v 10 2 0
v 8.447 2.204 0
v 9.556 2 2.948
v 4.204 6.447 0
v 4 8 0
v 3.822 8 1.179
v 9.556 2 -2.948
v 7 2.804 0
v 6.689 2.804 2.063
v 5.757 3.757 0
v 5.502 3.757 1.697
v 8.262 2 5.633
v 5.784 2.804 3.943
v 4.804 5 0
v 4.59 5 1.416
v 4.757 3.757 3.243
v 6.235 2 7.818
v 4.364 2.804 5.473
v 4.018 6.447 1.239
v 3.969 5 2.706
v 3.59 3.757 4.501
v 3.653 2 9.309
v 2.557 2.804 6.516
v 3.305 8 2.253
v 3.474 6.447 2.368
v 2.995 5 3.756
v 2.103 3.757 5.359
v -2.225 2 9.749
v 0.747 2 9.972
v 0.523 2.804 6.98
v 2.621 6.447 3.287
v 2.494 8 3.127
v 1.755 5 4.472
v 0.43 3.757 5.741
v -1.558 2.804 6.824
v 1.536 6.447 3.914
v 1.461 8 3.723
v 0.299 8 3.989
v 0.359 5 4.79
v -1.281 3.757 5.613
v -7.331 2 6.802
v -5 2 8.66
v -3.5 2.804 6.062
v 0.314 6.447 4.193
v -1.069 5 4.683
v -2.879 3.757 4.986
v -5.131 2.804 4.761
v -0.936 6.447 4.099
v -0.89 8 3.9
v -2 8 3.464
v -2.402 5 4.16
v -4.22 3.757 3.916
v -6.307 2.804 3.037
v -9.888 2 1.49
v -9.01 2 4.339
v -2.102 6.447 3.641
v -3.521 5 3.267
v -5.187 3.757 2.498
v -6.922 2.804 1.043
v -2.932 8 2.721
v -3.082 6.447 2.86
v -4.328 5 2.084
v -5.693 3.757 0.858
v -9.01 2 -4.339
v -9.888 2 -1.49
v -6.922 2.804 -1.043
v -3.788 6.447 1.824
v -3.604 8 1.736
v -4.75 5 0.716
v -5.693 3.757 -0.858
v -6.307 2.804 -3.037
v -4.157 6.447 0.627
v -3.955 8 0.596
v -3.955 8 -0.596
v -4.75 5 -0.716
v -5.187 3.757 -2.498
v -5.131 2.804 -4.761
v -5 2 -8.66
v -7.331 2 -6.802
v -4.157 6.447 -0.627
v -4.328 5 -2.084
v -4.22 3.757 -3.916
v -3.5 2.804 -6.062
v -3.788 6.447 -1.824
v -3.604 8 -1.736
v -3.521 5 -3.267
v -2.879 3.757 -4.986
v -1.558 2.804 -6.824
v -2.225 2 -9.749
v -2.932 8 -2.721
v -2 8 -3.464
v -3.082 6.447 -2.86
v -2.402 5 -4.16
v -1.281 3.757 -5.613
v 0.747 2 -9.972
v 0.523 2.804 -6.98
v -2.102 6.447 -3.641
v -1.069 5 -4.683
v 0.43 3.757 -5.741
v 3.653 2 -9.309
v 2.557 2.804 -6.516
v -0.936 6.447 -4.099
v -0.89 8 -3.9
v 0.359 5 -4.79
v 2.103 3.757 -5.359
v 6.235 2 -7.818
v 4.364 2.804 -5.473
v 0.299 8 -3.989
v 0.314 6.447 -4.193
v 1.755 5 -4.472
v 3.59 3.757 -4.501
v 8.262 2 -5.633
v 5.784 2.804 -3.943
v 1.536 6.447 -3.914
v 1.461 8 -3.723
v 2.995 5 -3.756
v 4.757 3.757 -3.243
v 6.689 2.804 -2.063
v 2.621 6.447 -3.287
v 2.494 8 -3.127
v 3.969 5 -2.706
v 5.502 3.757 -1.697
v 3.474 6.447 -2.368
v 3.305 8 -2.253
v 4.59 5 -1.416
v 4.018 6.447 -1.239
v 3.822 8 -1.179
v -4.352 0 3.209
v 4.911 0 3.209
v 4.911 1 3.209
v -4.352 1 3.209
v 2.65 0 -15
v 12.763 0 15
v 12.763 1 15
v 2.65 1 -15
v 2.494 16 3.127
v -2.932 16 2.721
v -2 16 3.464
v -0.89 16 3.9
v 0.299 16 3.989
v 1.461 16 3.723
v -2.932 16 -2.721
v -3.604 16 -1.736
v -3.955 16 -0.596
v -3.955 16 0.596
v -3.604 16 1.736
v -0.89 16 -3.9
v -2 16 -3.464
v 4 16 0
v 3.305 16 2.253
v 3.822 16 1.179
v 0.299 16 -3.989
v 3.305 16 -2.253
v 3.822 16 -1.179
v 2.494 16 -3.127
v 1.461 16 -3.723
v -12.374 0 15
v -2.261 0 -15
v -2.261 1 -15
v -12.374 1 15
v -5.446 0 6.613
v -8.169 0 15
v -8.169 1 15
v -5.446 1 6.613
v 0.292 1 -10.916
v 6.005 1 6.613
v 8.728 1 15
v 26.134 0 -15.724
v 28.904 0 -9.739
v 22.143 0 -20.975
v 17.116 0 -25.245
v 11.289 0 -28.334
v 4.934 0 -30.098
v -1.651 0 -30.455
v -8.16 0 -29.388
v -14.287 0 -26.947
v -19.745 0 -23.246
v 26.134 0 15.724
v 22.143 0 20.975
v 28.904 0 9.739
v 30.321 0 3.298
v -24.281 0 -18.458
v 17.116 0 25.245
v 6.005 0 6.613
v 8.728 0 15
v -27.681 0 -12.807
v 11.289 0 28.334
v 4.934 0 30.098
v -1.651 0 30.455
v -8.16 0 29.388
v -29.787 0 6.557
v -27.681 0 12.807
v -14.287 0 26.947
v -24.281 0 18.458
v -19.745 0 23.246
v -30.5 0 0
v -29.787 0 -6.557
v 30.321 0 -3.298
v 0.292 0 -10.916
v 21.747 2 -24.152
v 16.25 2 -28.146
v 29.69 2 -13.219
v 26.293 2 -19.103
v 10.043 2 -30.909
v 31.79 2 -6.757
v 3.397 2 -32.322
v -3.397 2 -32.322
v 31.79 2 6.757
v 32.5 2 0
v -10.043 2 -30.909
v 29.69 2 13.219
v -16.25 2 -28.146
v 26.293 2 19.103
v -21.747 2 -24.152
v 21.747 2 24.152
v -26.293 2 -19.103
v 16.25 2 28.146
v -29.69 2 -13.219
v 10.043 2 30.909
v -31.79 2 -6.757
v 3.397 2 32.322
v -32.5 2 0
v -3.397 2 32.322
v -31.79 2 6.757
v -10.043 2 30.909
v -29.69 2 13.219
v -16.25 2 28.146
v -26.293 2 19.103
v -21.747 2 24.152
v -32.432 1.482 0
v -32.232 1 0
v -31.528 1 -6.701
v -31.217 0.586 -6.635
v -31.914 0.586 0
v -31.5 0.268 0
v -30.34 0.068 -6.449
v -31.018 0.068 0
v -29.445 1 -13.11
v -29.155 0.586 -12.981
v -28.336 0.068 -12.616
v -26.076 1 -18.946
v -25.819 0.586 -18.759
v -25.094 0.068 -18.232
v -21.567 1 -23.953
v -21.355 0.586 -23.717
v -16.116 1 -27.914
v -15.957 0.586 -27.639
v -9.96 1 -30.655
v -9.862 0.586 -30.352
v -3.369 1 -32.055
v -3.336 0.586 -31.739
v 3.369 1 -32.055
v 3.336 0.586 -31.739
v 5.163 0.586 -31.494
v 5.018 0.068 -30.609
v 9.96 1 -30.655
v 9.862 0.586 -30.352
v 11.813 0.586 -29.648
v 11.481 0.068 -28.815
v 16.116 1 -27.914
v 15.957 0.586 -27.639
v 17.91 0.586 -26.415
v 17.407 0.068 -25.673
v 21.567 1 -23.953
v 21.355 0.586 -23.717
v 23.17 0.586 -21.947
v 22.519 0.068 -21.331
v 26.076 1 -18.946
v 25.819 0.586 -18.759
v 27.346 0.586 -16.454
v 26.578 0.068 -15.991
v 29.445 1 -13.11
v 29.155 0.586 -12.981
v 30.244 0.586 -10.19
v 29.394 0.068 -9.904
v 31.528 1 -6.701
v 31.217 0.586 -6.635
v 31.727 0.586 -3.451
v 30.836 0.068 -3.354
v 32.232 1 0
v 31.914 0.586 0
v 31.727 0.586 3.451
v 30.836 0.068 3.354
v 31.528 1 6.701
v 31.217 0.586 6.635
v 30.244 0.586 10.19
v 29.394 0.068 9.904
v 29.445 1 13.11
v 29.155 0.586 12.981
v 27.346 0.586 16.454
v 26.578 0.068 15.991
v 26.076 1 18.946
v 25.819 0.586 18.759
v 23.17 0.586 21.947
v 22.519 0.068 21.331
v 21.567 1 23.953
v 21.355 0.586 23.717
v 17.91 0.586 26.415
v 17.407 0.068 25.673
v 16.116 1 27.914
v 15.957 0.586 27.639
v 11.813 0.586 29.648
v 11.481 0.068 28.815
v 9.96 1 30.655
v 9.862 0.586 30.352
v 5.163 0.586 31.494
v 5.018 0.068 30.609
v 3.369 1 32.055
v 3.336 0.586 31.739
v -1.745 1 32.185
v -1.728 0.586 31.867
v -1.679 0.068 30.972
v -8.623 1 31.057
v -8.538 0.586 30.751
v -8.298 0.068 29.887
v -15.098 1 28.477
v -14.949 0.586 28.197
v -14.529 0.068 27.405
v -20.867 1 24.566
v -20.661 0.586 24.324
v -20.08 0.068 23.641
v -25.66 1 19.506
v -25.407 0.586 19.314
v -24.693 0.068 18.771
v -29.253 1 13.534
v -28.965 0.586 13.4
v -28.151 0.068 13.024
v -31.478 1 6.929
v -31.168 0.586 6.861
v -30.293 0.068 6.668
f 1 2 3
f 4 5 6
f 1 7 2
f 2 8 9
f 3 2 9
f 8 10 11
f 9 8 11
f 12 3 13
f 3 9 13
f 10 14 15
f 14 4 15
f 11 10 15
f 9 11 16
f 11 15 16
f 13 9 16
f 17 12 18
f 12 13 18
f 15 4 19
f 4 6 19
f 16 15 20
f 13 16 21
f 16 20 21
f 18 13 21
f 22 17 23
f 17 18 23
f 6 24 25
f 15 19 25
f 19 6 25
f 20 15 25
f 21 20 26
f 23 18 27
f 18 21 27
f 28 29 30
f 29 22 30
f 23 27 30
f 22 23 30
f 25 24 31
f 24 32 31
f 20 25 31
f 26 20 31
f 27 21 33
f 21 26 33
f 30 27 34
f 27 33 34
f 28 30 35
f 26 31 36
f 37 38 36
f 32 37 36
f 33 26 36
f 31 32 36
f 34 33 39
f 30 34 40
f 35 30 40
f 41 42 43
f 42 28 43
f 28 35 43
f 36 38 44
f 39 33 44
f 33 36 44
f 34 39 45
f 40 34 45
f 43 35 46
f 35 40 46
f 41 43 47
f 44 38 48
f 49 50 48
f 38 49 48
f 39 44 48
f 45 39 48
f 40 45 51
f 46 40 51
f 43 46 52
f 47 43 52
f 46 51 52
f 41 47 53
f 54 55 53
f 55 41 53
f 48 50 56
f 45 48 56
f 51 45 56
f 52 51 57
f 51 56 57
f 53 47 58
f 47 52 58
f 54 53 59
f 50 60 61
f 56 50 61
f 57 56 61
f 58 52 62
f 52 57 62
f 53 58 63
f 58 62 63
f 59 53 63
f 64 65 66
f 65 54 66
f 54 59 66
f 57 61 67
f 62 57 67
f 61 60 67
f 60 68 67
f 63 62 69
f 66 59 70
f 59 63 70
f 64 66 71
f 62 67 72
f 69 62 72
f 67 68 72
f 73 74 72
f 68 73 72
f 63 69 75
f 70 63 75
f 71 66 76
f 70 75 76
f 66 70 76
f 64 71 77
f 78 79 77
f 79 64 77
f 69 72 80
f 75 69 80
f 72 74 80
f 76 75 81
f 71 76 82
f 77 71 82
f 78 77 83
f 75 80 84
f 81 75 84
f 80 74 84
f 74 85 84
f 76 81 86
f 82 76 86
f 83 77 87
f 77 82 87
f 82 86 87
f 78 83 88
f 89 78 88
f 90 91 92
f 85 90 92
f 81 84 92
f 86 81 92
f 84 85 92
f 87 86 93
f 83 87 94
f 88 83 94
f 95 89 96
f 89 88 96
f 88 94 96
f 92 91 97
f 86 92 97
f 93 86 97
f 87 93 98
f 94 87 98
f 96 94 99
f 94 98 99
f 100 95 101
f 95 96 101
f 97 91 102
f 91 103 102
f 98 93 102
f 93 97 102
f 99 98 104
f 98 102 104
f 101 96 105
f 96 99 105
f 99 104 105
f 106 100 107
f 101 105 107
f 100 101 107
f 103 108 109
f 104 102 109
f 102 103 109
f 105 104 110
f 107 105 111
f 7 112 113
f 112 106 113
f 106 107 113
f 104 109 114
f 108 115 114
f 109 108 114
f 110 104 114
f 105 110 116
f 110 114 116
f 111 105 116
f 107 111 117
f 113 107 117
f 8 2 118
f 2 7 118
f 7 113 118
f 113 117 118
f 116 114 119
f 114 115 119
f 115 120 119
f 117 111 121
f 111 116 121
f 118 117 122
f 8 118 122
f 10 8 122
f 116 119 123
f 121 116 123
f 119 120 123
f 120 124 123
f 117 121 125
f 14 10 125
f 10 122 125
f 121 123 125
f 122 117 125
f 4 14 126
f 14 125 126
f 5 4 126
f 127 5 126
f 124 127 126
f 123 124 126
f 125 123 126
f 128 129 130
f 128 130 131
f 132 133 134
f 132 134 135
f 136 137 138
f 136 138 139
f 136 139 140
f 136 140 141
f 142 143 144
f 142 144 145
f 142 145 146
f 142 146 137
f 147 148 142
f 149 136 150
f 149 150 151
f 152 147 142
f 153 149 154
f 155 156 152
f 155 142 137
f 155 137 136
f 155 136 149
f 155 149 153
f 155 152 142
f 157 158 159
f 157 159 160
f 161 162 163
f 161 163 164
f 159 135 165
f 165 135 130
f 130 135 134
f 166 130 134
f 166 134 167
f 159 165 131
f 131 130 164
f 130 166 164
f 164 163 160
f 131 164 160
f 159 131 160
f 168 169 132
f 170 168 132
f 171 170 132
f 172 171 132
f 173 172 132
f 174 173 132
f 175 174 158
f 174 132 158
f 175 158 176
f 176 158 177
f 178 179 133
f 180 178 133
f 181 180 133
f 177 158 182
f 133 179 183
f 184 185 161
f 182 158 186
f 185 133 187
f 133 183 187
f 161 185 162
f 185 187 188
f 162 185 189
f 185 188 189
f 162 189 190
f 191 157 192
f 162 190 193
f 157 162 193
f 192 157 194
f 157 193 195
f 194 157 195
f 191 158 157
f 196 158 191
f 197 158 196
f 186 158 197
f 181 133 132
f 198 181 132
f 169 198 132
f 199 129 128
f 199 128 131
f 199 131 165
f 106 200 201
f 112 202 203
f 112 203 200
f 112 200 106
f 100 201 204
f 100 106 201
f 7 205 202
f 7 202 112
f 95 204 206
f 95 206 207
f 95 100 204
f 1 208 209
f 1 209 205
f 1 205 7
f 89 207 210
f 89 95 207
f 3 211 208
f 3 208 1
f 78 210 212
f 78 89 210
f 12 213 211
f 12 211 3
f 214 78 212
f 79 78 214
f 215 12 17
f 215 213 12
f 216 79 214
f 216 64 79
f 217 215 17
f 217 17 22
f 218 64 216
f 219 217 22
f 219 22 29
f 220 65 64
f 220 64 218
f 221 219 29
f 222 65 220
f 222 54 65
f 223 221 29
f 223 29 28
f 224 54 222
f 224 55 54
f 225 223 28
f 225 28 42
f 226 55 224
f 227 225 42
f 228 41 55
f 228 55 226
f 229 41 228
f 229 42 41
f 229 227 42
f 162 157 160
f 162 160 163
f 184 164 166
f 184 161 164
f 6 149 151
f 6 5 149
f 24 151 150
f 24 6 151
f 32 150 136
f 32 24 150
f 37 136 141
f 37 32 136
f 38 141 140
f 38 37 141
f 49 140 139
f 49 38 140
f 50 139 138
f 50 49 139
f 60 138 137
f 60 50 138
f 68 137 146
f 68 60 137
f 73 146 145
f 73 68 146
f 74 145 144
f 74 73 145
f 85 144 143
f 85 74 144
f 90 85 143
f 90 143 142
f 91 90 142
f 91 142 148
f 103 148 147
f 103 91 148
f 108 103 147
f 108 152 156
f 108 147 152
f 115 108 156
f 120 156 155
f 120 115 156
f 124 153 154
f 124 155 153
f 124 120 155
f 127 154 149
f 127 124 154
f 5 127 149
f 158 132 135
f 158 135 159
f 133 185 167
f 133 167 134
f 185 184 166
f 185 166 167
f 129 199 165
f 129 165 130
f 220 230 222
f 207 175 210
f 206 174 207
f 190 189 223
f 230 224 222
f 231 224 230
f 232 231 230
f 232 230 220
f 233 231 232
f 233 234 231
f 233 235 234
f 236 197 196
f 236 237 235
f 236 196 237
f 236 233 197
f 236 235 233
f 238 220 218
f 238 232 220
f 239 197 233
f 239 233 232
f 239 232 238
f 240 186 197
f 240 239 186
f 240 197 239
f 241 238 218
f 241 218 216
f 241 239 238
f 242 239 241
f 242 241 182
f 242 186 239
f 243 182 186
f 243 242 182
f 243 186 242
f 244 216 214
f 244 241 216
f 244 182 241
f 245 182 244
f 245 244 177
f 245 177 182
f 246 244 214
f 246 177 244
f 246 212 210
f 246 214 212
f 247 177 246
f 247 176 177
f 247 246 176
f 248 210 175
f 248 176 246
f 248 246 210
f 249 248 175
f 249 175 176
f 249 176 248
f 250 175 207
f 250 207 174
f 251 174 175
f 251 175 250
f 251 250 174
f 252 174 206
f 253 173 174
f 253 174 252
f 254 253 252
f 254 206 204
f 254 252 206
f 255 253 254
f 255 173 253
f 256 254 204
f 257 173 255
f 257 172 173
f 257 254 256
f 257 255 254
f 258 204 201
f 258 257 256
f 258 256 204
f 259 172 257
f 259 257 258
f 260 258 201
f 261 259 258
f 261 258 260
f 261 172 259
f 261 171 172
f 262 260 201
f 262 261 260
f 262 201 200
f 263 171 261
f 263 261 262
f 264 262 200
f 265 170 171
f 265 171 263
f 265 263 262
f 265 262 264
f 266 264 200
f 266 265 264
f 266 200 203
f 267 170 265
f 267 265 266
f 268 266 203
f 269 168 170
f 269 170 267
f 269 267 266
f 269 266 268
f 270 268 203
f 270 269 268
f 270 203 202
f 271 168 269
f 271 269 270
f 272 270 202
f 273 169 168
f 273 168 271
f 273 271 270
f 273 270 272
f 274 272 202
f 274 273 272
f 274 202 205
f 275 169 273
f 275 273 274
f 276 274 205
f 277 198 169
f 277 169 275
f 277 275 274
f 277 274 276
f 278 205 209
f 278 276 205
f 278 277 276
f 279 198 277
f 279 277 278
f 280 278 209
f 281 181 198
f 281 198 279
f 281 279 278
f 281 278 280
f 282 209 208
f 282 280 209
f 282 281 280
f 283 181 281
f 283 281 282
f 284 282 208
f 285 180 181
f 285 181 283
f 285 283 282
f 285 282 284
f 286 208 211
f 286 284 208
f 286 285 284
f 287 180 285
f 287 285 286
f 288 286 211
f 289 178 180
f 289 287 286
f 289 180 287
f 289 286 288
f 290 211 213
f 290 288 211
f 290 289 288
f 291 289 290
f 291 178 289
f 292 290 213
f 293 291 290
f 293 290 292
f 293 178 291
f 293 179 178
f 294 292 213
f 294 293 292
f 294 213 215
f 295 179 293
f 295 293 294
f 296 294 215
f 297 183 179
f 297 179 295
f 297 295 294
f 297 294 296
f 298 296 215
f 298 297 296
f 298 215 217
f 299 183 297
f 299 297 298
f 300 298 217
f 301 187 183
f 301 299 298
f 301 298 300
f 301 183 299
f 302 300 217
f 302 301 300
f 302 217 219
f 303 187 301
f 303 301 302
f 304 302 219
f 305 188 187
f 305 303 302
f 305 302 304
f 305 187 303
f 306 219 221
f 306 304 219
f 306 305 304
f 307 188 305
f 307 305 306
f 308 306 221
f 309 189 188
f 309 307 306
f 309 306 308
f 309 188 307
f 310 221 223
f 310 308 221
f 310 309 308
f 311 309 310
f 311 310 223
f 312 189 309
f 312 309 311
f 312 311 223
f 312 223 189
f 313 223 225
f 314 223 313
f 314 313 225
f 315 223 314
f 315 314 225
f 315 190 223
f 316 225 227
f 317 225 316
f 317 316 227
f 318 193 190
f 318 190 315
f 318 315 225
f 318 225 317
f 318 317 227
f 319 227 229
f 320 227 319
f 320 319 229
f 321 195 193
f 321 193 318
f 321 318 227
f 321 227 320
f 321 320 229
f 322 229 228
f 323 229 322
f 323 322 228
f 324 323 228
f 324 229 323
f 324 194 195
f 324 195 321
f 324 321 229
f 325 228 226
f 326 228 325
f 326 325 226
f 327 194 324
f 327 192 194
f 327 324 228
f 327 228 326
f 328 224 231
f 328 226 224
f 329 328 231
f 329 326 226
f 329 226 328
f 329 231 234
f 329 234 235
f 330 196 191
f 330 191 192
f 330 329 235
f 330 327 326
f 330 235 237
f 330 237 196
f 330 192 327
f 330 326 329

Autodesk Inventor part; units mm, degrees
ref_plane "YZ Plane" through (0, 0, 0) normal (1, 0, 0) x (0, 1, 0)
ref_plane "XZ Plane" through (0, 0, 0) normal (0, 1, 0) x (-1, 0, 0)
ref_plane "XY Plane" through (0, 0, 0) normal (0, 0, 1) x (1, 0, 0)
sketch "Sketch1" plane through (0, 0, 0) normal (0, 1, 0) x (-1, 0, 0)
  circle A0 centre (0, 0) radius 32.5
  dimension "d0" = 65
extrude "Extrusion3" add sketch "Sketch1" along normal blind 2
sketch "Sketch3" plane through (0, 2, 0) normal (0, 1, 0) x (1, 0, 0)
  circle A0 centre (0, 0) radius 4
  dimension "d17" = 8
extrude "Extrusion4" add sketch "Sketch3" along normal blind 14
fillet "Fillet2" radius 6 1 edges at (-4, 2, 0)
fillet "Fillet3" radius 2 1 edges at (32.5, 0, 0)
sketch "Sketch4" plane through (0, 0, 0) normal (0, -1, 0) x (1, 0, 0)
  line L0 (32.5, -32.5) -> (-32.5, -32.5) construction
  line L1 (-32.5, -32.5) -> (-32.5, 32.5) construction
  line L2 (-32.5, 32.5) -> (32.5, 32.5) construction
  line L3 (32.5, 32.5) -> (32.5, -32.5) construction
  line L4 (32.5, 32.5) -> (-32.5, 32.5)
  line L5 (-32.5, 32.5) -> (-32.5, -32.5)
  line L6 (-32.5, -32.5) -> (32.5, -32.5)
  line L7 (32.5, -32.5) -> (32.5, 32.5)
  circle A0 centre (0, 0) radius 4 projected
  line L8 (32.5, 32.5) -> (-32.5, -32.5) construction
  line L9 (-32.5, 32.5) -> (32.5, -32.5) construction
  line L10 (12.7634, 15) -> (2.6499, -15)
  line L11 (2.6499, -15) -> (-2.2609, -15)
  line L12 (-2.2609, -15) -> (-12.3744, 15)
  line L13 (-12.3744, 15) -> (-8.1686, 15)
  line L14 (-8.1686, 15) -> (-5.4457, 6.6126)
  line L15 (-5.4457, 6.6126) -> (6.0049, 6.6126)
  line L16 (6.0049, 6.6126) -> (8.7277, 15)
  line L17 (8.7277, 15) -> (12.7634, 15)
  line L18 (-4.3517, 3.2091) -> (0.2917, -10.9157)
  line L19 (0.2917, -10.9157) -> (4.9109, 3.2091)
  line L20 (4.9109, 3.2091) -> (-4.3517, 3.2091)
  dimension "d22" = 65
  dimension "d23" = 65
  dimension "d24" = 65
  dimension "d25" = 65
  dimension "d26" = 0
  dimension "d27" = 0
emboss "Emboss2" sketch "Sketch4" operation cut depth 1 direction (0, 1, 0) contours A0 L19 | L20 A0 | A0 L18 | L10 L11 L12 L13 L14 L15 L16 L17
properties part number "Stepper_Closing_1"
